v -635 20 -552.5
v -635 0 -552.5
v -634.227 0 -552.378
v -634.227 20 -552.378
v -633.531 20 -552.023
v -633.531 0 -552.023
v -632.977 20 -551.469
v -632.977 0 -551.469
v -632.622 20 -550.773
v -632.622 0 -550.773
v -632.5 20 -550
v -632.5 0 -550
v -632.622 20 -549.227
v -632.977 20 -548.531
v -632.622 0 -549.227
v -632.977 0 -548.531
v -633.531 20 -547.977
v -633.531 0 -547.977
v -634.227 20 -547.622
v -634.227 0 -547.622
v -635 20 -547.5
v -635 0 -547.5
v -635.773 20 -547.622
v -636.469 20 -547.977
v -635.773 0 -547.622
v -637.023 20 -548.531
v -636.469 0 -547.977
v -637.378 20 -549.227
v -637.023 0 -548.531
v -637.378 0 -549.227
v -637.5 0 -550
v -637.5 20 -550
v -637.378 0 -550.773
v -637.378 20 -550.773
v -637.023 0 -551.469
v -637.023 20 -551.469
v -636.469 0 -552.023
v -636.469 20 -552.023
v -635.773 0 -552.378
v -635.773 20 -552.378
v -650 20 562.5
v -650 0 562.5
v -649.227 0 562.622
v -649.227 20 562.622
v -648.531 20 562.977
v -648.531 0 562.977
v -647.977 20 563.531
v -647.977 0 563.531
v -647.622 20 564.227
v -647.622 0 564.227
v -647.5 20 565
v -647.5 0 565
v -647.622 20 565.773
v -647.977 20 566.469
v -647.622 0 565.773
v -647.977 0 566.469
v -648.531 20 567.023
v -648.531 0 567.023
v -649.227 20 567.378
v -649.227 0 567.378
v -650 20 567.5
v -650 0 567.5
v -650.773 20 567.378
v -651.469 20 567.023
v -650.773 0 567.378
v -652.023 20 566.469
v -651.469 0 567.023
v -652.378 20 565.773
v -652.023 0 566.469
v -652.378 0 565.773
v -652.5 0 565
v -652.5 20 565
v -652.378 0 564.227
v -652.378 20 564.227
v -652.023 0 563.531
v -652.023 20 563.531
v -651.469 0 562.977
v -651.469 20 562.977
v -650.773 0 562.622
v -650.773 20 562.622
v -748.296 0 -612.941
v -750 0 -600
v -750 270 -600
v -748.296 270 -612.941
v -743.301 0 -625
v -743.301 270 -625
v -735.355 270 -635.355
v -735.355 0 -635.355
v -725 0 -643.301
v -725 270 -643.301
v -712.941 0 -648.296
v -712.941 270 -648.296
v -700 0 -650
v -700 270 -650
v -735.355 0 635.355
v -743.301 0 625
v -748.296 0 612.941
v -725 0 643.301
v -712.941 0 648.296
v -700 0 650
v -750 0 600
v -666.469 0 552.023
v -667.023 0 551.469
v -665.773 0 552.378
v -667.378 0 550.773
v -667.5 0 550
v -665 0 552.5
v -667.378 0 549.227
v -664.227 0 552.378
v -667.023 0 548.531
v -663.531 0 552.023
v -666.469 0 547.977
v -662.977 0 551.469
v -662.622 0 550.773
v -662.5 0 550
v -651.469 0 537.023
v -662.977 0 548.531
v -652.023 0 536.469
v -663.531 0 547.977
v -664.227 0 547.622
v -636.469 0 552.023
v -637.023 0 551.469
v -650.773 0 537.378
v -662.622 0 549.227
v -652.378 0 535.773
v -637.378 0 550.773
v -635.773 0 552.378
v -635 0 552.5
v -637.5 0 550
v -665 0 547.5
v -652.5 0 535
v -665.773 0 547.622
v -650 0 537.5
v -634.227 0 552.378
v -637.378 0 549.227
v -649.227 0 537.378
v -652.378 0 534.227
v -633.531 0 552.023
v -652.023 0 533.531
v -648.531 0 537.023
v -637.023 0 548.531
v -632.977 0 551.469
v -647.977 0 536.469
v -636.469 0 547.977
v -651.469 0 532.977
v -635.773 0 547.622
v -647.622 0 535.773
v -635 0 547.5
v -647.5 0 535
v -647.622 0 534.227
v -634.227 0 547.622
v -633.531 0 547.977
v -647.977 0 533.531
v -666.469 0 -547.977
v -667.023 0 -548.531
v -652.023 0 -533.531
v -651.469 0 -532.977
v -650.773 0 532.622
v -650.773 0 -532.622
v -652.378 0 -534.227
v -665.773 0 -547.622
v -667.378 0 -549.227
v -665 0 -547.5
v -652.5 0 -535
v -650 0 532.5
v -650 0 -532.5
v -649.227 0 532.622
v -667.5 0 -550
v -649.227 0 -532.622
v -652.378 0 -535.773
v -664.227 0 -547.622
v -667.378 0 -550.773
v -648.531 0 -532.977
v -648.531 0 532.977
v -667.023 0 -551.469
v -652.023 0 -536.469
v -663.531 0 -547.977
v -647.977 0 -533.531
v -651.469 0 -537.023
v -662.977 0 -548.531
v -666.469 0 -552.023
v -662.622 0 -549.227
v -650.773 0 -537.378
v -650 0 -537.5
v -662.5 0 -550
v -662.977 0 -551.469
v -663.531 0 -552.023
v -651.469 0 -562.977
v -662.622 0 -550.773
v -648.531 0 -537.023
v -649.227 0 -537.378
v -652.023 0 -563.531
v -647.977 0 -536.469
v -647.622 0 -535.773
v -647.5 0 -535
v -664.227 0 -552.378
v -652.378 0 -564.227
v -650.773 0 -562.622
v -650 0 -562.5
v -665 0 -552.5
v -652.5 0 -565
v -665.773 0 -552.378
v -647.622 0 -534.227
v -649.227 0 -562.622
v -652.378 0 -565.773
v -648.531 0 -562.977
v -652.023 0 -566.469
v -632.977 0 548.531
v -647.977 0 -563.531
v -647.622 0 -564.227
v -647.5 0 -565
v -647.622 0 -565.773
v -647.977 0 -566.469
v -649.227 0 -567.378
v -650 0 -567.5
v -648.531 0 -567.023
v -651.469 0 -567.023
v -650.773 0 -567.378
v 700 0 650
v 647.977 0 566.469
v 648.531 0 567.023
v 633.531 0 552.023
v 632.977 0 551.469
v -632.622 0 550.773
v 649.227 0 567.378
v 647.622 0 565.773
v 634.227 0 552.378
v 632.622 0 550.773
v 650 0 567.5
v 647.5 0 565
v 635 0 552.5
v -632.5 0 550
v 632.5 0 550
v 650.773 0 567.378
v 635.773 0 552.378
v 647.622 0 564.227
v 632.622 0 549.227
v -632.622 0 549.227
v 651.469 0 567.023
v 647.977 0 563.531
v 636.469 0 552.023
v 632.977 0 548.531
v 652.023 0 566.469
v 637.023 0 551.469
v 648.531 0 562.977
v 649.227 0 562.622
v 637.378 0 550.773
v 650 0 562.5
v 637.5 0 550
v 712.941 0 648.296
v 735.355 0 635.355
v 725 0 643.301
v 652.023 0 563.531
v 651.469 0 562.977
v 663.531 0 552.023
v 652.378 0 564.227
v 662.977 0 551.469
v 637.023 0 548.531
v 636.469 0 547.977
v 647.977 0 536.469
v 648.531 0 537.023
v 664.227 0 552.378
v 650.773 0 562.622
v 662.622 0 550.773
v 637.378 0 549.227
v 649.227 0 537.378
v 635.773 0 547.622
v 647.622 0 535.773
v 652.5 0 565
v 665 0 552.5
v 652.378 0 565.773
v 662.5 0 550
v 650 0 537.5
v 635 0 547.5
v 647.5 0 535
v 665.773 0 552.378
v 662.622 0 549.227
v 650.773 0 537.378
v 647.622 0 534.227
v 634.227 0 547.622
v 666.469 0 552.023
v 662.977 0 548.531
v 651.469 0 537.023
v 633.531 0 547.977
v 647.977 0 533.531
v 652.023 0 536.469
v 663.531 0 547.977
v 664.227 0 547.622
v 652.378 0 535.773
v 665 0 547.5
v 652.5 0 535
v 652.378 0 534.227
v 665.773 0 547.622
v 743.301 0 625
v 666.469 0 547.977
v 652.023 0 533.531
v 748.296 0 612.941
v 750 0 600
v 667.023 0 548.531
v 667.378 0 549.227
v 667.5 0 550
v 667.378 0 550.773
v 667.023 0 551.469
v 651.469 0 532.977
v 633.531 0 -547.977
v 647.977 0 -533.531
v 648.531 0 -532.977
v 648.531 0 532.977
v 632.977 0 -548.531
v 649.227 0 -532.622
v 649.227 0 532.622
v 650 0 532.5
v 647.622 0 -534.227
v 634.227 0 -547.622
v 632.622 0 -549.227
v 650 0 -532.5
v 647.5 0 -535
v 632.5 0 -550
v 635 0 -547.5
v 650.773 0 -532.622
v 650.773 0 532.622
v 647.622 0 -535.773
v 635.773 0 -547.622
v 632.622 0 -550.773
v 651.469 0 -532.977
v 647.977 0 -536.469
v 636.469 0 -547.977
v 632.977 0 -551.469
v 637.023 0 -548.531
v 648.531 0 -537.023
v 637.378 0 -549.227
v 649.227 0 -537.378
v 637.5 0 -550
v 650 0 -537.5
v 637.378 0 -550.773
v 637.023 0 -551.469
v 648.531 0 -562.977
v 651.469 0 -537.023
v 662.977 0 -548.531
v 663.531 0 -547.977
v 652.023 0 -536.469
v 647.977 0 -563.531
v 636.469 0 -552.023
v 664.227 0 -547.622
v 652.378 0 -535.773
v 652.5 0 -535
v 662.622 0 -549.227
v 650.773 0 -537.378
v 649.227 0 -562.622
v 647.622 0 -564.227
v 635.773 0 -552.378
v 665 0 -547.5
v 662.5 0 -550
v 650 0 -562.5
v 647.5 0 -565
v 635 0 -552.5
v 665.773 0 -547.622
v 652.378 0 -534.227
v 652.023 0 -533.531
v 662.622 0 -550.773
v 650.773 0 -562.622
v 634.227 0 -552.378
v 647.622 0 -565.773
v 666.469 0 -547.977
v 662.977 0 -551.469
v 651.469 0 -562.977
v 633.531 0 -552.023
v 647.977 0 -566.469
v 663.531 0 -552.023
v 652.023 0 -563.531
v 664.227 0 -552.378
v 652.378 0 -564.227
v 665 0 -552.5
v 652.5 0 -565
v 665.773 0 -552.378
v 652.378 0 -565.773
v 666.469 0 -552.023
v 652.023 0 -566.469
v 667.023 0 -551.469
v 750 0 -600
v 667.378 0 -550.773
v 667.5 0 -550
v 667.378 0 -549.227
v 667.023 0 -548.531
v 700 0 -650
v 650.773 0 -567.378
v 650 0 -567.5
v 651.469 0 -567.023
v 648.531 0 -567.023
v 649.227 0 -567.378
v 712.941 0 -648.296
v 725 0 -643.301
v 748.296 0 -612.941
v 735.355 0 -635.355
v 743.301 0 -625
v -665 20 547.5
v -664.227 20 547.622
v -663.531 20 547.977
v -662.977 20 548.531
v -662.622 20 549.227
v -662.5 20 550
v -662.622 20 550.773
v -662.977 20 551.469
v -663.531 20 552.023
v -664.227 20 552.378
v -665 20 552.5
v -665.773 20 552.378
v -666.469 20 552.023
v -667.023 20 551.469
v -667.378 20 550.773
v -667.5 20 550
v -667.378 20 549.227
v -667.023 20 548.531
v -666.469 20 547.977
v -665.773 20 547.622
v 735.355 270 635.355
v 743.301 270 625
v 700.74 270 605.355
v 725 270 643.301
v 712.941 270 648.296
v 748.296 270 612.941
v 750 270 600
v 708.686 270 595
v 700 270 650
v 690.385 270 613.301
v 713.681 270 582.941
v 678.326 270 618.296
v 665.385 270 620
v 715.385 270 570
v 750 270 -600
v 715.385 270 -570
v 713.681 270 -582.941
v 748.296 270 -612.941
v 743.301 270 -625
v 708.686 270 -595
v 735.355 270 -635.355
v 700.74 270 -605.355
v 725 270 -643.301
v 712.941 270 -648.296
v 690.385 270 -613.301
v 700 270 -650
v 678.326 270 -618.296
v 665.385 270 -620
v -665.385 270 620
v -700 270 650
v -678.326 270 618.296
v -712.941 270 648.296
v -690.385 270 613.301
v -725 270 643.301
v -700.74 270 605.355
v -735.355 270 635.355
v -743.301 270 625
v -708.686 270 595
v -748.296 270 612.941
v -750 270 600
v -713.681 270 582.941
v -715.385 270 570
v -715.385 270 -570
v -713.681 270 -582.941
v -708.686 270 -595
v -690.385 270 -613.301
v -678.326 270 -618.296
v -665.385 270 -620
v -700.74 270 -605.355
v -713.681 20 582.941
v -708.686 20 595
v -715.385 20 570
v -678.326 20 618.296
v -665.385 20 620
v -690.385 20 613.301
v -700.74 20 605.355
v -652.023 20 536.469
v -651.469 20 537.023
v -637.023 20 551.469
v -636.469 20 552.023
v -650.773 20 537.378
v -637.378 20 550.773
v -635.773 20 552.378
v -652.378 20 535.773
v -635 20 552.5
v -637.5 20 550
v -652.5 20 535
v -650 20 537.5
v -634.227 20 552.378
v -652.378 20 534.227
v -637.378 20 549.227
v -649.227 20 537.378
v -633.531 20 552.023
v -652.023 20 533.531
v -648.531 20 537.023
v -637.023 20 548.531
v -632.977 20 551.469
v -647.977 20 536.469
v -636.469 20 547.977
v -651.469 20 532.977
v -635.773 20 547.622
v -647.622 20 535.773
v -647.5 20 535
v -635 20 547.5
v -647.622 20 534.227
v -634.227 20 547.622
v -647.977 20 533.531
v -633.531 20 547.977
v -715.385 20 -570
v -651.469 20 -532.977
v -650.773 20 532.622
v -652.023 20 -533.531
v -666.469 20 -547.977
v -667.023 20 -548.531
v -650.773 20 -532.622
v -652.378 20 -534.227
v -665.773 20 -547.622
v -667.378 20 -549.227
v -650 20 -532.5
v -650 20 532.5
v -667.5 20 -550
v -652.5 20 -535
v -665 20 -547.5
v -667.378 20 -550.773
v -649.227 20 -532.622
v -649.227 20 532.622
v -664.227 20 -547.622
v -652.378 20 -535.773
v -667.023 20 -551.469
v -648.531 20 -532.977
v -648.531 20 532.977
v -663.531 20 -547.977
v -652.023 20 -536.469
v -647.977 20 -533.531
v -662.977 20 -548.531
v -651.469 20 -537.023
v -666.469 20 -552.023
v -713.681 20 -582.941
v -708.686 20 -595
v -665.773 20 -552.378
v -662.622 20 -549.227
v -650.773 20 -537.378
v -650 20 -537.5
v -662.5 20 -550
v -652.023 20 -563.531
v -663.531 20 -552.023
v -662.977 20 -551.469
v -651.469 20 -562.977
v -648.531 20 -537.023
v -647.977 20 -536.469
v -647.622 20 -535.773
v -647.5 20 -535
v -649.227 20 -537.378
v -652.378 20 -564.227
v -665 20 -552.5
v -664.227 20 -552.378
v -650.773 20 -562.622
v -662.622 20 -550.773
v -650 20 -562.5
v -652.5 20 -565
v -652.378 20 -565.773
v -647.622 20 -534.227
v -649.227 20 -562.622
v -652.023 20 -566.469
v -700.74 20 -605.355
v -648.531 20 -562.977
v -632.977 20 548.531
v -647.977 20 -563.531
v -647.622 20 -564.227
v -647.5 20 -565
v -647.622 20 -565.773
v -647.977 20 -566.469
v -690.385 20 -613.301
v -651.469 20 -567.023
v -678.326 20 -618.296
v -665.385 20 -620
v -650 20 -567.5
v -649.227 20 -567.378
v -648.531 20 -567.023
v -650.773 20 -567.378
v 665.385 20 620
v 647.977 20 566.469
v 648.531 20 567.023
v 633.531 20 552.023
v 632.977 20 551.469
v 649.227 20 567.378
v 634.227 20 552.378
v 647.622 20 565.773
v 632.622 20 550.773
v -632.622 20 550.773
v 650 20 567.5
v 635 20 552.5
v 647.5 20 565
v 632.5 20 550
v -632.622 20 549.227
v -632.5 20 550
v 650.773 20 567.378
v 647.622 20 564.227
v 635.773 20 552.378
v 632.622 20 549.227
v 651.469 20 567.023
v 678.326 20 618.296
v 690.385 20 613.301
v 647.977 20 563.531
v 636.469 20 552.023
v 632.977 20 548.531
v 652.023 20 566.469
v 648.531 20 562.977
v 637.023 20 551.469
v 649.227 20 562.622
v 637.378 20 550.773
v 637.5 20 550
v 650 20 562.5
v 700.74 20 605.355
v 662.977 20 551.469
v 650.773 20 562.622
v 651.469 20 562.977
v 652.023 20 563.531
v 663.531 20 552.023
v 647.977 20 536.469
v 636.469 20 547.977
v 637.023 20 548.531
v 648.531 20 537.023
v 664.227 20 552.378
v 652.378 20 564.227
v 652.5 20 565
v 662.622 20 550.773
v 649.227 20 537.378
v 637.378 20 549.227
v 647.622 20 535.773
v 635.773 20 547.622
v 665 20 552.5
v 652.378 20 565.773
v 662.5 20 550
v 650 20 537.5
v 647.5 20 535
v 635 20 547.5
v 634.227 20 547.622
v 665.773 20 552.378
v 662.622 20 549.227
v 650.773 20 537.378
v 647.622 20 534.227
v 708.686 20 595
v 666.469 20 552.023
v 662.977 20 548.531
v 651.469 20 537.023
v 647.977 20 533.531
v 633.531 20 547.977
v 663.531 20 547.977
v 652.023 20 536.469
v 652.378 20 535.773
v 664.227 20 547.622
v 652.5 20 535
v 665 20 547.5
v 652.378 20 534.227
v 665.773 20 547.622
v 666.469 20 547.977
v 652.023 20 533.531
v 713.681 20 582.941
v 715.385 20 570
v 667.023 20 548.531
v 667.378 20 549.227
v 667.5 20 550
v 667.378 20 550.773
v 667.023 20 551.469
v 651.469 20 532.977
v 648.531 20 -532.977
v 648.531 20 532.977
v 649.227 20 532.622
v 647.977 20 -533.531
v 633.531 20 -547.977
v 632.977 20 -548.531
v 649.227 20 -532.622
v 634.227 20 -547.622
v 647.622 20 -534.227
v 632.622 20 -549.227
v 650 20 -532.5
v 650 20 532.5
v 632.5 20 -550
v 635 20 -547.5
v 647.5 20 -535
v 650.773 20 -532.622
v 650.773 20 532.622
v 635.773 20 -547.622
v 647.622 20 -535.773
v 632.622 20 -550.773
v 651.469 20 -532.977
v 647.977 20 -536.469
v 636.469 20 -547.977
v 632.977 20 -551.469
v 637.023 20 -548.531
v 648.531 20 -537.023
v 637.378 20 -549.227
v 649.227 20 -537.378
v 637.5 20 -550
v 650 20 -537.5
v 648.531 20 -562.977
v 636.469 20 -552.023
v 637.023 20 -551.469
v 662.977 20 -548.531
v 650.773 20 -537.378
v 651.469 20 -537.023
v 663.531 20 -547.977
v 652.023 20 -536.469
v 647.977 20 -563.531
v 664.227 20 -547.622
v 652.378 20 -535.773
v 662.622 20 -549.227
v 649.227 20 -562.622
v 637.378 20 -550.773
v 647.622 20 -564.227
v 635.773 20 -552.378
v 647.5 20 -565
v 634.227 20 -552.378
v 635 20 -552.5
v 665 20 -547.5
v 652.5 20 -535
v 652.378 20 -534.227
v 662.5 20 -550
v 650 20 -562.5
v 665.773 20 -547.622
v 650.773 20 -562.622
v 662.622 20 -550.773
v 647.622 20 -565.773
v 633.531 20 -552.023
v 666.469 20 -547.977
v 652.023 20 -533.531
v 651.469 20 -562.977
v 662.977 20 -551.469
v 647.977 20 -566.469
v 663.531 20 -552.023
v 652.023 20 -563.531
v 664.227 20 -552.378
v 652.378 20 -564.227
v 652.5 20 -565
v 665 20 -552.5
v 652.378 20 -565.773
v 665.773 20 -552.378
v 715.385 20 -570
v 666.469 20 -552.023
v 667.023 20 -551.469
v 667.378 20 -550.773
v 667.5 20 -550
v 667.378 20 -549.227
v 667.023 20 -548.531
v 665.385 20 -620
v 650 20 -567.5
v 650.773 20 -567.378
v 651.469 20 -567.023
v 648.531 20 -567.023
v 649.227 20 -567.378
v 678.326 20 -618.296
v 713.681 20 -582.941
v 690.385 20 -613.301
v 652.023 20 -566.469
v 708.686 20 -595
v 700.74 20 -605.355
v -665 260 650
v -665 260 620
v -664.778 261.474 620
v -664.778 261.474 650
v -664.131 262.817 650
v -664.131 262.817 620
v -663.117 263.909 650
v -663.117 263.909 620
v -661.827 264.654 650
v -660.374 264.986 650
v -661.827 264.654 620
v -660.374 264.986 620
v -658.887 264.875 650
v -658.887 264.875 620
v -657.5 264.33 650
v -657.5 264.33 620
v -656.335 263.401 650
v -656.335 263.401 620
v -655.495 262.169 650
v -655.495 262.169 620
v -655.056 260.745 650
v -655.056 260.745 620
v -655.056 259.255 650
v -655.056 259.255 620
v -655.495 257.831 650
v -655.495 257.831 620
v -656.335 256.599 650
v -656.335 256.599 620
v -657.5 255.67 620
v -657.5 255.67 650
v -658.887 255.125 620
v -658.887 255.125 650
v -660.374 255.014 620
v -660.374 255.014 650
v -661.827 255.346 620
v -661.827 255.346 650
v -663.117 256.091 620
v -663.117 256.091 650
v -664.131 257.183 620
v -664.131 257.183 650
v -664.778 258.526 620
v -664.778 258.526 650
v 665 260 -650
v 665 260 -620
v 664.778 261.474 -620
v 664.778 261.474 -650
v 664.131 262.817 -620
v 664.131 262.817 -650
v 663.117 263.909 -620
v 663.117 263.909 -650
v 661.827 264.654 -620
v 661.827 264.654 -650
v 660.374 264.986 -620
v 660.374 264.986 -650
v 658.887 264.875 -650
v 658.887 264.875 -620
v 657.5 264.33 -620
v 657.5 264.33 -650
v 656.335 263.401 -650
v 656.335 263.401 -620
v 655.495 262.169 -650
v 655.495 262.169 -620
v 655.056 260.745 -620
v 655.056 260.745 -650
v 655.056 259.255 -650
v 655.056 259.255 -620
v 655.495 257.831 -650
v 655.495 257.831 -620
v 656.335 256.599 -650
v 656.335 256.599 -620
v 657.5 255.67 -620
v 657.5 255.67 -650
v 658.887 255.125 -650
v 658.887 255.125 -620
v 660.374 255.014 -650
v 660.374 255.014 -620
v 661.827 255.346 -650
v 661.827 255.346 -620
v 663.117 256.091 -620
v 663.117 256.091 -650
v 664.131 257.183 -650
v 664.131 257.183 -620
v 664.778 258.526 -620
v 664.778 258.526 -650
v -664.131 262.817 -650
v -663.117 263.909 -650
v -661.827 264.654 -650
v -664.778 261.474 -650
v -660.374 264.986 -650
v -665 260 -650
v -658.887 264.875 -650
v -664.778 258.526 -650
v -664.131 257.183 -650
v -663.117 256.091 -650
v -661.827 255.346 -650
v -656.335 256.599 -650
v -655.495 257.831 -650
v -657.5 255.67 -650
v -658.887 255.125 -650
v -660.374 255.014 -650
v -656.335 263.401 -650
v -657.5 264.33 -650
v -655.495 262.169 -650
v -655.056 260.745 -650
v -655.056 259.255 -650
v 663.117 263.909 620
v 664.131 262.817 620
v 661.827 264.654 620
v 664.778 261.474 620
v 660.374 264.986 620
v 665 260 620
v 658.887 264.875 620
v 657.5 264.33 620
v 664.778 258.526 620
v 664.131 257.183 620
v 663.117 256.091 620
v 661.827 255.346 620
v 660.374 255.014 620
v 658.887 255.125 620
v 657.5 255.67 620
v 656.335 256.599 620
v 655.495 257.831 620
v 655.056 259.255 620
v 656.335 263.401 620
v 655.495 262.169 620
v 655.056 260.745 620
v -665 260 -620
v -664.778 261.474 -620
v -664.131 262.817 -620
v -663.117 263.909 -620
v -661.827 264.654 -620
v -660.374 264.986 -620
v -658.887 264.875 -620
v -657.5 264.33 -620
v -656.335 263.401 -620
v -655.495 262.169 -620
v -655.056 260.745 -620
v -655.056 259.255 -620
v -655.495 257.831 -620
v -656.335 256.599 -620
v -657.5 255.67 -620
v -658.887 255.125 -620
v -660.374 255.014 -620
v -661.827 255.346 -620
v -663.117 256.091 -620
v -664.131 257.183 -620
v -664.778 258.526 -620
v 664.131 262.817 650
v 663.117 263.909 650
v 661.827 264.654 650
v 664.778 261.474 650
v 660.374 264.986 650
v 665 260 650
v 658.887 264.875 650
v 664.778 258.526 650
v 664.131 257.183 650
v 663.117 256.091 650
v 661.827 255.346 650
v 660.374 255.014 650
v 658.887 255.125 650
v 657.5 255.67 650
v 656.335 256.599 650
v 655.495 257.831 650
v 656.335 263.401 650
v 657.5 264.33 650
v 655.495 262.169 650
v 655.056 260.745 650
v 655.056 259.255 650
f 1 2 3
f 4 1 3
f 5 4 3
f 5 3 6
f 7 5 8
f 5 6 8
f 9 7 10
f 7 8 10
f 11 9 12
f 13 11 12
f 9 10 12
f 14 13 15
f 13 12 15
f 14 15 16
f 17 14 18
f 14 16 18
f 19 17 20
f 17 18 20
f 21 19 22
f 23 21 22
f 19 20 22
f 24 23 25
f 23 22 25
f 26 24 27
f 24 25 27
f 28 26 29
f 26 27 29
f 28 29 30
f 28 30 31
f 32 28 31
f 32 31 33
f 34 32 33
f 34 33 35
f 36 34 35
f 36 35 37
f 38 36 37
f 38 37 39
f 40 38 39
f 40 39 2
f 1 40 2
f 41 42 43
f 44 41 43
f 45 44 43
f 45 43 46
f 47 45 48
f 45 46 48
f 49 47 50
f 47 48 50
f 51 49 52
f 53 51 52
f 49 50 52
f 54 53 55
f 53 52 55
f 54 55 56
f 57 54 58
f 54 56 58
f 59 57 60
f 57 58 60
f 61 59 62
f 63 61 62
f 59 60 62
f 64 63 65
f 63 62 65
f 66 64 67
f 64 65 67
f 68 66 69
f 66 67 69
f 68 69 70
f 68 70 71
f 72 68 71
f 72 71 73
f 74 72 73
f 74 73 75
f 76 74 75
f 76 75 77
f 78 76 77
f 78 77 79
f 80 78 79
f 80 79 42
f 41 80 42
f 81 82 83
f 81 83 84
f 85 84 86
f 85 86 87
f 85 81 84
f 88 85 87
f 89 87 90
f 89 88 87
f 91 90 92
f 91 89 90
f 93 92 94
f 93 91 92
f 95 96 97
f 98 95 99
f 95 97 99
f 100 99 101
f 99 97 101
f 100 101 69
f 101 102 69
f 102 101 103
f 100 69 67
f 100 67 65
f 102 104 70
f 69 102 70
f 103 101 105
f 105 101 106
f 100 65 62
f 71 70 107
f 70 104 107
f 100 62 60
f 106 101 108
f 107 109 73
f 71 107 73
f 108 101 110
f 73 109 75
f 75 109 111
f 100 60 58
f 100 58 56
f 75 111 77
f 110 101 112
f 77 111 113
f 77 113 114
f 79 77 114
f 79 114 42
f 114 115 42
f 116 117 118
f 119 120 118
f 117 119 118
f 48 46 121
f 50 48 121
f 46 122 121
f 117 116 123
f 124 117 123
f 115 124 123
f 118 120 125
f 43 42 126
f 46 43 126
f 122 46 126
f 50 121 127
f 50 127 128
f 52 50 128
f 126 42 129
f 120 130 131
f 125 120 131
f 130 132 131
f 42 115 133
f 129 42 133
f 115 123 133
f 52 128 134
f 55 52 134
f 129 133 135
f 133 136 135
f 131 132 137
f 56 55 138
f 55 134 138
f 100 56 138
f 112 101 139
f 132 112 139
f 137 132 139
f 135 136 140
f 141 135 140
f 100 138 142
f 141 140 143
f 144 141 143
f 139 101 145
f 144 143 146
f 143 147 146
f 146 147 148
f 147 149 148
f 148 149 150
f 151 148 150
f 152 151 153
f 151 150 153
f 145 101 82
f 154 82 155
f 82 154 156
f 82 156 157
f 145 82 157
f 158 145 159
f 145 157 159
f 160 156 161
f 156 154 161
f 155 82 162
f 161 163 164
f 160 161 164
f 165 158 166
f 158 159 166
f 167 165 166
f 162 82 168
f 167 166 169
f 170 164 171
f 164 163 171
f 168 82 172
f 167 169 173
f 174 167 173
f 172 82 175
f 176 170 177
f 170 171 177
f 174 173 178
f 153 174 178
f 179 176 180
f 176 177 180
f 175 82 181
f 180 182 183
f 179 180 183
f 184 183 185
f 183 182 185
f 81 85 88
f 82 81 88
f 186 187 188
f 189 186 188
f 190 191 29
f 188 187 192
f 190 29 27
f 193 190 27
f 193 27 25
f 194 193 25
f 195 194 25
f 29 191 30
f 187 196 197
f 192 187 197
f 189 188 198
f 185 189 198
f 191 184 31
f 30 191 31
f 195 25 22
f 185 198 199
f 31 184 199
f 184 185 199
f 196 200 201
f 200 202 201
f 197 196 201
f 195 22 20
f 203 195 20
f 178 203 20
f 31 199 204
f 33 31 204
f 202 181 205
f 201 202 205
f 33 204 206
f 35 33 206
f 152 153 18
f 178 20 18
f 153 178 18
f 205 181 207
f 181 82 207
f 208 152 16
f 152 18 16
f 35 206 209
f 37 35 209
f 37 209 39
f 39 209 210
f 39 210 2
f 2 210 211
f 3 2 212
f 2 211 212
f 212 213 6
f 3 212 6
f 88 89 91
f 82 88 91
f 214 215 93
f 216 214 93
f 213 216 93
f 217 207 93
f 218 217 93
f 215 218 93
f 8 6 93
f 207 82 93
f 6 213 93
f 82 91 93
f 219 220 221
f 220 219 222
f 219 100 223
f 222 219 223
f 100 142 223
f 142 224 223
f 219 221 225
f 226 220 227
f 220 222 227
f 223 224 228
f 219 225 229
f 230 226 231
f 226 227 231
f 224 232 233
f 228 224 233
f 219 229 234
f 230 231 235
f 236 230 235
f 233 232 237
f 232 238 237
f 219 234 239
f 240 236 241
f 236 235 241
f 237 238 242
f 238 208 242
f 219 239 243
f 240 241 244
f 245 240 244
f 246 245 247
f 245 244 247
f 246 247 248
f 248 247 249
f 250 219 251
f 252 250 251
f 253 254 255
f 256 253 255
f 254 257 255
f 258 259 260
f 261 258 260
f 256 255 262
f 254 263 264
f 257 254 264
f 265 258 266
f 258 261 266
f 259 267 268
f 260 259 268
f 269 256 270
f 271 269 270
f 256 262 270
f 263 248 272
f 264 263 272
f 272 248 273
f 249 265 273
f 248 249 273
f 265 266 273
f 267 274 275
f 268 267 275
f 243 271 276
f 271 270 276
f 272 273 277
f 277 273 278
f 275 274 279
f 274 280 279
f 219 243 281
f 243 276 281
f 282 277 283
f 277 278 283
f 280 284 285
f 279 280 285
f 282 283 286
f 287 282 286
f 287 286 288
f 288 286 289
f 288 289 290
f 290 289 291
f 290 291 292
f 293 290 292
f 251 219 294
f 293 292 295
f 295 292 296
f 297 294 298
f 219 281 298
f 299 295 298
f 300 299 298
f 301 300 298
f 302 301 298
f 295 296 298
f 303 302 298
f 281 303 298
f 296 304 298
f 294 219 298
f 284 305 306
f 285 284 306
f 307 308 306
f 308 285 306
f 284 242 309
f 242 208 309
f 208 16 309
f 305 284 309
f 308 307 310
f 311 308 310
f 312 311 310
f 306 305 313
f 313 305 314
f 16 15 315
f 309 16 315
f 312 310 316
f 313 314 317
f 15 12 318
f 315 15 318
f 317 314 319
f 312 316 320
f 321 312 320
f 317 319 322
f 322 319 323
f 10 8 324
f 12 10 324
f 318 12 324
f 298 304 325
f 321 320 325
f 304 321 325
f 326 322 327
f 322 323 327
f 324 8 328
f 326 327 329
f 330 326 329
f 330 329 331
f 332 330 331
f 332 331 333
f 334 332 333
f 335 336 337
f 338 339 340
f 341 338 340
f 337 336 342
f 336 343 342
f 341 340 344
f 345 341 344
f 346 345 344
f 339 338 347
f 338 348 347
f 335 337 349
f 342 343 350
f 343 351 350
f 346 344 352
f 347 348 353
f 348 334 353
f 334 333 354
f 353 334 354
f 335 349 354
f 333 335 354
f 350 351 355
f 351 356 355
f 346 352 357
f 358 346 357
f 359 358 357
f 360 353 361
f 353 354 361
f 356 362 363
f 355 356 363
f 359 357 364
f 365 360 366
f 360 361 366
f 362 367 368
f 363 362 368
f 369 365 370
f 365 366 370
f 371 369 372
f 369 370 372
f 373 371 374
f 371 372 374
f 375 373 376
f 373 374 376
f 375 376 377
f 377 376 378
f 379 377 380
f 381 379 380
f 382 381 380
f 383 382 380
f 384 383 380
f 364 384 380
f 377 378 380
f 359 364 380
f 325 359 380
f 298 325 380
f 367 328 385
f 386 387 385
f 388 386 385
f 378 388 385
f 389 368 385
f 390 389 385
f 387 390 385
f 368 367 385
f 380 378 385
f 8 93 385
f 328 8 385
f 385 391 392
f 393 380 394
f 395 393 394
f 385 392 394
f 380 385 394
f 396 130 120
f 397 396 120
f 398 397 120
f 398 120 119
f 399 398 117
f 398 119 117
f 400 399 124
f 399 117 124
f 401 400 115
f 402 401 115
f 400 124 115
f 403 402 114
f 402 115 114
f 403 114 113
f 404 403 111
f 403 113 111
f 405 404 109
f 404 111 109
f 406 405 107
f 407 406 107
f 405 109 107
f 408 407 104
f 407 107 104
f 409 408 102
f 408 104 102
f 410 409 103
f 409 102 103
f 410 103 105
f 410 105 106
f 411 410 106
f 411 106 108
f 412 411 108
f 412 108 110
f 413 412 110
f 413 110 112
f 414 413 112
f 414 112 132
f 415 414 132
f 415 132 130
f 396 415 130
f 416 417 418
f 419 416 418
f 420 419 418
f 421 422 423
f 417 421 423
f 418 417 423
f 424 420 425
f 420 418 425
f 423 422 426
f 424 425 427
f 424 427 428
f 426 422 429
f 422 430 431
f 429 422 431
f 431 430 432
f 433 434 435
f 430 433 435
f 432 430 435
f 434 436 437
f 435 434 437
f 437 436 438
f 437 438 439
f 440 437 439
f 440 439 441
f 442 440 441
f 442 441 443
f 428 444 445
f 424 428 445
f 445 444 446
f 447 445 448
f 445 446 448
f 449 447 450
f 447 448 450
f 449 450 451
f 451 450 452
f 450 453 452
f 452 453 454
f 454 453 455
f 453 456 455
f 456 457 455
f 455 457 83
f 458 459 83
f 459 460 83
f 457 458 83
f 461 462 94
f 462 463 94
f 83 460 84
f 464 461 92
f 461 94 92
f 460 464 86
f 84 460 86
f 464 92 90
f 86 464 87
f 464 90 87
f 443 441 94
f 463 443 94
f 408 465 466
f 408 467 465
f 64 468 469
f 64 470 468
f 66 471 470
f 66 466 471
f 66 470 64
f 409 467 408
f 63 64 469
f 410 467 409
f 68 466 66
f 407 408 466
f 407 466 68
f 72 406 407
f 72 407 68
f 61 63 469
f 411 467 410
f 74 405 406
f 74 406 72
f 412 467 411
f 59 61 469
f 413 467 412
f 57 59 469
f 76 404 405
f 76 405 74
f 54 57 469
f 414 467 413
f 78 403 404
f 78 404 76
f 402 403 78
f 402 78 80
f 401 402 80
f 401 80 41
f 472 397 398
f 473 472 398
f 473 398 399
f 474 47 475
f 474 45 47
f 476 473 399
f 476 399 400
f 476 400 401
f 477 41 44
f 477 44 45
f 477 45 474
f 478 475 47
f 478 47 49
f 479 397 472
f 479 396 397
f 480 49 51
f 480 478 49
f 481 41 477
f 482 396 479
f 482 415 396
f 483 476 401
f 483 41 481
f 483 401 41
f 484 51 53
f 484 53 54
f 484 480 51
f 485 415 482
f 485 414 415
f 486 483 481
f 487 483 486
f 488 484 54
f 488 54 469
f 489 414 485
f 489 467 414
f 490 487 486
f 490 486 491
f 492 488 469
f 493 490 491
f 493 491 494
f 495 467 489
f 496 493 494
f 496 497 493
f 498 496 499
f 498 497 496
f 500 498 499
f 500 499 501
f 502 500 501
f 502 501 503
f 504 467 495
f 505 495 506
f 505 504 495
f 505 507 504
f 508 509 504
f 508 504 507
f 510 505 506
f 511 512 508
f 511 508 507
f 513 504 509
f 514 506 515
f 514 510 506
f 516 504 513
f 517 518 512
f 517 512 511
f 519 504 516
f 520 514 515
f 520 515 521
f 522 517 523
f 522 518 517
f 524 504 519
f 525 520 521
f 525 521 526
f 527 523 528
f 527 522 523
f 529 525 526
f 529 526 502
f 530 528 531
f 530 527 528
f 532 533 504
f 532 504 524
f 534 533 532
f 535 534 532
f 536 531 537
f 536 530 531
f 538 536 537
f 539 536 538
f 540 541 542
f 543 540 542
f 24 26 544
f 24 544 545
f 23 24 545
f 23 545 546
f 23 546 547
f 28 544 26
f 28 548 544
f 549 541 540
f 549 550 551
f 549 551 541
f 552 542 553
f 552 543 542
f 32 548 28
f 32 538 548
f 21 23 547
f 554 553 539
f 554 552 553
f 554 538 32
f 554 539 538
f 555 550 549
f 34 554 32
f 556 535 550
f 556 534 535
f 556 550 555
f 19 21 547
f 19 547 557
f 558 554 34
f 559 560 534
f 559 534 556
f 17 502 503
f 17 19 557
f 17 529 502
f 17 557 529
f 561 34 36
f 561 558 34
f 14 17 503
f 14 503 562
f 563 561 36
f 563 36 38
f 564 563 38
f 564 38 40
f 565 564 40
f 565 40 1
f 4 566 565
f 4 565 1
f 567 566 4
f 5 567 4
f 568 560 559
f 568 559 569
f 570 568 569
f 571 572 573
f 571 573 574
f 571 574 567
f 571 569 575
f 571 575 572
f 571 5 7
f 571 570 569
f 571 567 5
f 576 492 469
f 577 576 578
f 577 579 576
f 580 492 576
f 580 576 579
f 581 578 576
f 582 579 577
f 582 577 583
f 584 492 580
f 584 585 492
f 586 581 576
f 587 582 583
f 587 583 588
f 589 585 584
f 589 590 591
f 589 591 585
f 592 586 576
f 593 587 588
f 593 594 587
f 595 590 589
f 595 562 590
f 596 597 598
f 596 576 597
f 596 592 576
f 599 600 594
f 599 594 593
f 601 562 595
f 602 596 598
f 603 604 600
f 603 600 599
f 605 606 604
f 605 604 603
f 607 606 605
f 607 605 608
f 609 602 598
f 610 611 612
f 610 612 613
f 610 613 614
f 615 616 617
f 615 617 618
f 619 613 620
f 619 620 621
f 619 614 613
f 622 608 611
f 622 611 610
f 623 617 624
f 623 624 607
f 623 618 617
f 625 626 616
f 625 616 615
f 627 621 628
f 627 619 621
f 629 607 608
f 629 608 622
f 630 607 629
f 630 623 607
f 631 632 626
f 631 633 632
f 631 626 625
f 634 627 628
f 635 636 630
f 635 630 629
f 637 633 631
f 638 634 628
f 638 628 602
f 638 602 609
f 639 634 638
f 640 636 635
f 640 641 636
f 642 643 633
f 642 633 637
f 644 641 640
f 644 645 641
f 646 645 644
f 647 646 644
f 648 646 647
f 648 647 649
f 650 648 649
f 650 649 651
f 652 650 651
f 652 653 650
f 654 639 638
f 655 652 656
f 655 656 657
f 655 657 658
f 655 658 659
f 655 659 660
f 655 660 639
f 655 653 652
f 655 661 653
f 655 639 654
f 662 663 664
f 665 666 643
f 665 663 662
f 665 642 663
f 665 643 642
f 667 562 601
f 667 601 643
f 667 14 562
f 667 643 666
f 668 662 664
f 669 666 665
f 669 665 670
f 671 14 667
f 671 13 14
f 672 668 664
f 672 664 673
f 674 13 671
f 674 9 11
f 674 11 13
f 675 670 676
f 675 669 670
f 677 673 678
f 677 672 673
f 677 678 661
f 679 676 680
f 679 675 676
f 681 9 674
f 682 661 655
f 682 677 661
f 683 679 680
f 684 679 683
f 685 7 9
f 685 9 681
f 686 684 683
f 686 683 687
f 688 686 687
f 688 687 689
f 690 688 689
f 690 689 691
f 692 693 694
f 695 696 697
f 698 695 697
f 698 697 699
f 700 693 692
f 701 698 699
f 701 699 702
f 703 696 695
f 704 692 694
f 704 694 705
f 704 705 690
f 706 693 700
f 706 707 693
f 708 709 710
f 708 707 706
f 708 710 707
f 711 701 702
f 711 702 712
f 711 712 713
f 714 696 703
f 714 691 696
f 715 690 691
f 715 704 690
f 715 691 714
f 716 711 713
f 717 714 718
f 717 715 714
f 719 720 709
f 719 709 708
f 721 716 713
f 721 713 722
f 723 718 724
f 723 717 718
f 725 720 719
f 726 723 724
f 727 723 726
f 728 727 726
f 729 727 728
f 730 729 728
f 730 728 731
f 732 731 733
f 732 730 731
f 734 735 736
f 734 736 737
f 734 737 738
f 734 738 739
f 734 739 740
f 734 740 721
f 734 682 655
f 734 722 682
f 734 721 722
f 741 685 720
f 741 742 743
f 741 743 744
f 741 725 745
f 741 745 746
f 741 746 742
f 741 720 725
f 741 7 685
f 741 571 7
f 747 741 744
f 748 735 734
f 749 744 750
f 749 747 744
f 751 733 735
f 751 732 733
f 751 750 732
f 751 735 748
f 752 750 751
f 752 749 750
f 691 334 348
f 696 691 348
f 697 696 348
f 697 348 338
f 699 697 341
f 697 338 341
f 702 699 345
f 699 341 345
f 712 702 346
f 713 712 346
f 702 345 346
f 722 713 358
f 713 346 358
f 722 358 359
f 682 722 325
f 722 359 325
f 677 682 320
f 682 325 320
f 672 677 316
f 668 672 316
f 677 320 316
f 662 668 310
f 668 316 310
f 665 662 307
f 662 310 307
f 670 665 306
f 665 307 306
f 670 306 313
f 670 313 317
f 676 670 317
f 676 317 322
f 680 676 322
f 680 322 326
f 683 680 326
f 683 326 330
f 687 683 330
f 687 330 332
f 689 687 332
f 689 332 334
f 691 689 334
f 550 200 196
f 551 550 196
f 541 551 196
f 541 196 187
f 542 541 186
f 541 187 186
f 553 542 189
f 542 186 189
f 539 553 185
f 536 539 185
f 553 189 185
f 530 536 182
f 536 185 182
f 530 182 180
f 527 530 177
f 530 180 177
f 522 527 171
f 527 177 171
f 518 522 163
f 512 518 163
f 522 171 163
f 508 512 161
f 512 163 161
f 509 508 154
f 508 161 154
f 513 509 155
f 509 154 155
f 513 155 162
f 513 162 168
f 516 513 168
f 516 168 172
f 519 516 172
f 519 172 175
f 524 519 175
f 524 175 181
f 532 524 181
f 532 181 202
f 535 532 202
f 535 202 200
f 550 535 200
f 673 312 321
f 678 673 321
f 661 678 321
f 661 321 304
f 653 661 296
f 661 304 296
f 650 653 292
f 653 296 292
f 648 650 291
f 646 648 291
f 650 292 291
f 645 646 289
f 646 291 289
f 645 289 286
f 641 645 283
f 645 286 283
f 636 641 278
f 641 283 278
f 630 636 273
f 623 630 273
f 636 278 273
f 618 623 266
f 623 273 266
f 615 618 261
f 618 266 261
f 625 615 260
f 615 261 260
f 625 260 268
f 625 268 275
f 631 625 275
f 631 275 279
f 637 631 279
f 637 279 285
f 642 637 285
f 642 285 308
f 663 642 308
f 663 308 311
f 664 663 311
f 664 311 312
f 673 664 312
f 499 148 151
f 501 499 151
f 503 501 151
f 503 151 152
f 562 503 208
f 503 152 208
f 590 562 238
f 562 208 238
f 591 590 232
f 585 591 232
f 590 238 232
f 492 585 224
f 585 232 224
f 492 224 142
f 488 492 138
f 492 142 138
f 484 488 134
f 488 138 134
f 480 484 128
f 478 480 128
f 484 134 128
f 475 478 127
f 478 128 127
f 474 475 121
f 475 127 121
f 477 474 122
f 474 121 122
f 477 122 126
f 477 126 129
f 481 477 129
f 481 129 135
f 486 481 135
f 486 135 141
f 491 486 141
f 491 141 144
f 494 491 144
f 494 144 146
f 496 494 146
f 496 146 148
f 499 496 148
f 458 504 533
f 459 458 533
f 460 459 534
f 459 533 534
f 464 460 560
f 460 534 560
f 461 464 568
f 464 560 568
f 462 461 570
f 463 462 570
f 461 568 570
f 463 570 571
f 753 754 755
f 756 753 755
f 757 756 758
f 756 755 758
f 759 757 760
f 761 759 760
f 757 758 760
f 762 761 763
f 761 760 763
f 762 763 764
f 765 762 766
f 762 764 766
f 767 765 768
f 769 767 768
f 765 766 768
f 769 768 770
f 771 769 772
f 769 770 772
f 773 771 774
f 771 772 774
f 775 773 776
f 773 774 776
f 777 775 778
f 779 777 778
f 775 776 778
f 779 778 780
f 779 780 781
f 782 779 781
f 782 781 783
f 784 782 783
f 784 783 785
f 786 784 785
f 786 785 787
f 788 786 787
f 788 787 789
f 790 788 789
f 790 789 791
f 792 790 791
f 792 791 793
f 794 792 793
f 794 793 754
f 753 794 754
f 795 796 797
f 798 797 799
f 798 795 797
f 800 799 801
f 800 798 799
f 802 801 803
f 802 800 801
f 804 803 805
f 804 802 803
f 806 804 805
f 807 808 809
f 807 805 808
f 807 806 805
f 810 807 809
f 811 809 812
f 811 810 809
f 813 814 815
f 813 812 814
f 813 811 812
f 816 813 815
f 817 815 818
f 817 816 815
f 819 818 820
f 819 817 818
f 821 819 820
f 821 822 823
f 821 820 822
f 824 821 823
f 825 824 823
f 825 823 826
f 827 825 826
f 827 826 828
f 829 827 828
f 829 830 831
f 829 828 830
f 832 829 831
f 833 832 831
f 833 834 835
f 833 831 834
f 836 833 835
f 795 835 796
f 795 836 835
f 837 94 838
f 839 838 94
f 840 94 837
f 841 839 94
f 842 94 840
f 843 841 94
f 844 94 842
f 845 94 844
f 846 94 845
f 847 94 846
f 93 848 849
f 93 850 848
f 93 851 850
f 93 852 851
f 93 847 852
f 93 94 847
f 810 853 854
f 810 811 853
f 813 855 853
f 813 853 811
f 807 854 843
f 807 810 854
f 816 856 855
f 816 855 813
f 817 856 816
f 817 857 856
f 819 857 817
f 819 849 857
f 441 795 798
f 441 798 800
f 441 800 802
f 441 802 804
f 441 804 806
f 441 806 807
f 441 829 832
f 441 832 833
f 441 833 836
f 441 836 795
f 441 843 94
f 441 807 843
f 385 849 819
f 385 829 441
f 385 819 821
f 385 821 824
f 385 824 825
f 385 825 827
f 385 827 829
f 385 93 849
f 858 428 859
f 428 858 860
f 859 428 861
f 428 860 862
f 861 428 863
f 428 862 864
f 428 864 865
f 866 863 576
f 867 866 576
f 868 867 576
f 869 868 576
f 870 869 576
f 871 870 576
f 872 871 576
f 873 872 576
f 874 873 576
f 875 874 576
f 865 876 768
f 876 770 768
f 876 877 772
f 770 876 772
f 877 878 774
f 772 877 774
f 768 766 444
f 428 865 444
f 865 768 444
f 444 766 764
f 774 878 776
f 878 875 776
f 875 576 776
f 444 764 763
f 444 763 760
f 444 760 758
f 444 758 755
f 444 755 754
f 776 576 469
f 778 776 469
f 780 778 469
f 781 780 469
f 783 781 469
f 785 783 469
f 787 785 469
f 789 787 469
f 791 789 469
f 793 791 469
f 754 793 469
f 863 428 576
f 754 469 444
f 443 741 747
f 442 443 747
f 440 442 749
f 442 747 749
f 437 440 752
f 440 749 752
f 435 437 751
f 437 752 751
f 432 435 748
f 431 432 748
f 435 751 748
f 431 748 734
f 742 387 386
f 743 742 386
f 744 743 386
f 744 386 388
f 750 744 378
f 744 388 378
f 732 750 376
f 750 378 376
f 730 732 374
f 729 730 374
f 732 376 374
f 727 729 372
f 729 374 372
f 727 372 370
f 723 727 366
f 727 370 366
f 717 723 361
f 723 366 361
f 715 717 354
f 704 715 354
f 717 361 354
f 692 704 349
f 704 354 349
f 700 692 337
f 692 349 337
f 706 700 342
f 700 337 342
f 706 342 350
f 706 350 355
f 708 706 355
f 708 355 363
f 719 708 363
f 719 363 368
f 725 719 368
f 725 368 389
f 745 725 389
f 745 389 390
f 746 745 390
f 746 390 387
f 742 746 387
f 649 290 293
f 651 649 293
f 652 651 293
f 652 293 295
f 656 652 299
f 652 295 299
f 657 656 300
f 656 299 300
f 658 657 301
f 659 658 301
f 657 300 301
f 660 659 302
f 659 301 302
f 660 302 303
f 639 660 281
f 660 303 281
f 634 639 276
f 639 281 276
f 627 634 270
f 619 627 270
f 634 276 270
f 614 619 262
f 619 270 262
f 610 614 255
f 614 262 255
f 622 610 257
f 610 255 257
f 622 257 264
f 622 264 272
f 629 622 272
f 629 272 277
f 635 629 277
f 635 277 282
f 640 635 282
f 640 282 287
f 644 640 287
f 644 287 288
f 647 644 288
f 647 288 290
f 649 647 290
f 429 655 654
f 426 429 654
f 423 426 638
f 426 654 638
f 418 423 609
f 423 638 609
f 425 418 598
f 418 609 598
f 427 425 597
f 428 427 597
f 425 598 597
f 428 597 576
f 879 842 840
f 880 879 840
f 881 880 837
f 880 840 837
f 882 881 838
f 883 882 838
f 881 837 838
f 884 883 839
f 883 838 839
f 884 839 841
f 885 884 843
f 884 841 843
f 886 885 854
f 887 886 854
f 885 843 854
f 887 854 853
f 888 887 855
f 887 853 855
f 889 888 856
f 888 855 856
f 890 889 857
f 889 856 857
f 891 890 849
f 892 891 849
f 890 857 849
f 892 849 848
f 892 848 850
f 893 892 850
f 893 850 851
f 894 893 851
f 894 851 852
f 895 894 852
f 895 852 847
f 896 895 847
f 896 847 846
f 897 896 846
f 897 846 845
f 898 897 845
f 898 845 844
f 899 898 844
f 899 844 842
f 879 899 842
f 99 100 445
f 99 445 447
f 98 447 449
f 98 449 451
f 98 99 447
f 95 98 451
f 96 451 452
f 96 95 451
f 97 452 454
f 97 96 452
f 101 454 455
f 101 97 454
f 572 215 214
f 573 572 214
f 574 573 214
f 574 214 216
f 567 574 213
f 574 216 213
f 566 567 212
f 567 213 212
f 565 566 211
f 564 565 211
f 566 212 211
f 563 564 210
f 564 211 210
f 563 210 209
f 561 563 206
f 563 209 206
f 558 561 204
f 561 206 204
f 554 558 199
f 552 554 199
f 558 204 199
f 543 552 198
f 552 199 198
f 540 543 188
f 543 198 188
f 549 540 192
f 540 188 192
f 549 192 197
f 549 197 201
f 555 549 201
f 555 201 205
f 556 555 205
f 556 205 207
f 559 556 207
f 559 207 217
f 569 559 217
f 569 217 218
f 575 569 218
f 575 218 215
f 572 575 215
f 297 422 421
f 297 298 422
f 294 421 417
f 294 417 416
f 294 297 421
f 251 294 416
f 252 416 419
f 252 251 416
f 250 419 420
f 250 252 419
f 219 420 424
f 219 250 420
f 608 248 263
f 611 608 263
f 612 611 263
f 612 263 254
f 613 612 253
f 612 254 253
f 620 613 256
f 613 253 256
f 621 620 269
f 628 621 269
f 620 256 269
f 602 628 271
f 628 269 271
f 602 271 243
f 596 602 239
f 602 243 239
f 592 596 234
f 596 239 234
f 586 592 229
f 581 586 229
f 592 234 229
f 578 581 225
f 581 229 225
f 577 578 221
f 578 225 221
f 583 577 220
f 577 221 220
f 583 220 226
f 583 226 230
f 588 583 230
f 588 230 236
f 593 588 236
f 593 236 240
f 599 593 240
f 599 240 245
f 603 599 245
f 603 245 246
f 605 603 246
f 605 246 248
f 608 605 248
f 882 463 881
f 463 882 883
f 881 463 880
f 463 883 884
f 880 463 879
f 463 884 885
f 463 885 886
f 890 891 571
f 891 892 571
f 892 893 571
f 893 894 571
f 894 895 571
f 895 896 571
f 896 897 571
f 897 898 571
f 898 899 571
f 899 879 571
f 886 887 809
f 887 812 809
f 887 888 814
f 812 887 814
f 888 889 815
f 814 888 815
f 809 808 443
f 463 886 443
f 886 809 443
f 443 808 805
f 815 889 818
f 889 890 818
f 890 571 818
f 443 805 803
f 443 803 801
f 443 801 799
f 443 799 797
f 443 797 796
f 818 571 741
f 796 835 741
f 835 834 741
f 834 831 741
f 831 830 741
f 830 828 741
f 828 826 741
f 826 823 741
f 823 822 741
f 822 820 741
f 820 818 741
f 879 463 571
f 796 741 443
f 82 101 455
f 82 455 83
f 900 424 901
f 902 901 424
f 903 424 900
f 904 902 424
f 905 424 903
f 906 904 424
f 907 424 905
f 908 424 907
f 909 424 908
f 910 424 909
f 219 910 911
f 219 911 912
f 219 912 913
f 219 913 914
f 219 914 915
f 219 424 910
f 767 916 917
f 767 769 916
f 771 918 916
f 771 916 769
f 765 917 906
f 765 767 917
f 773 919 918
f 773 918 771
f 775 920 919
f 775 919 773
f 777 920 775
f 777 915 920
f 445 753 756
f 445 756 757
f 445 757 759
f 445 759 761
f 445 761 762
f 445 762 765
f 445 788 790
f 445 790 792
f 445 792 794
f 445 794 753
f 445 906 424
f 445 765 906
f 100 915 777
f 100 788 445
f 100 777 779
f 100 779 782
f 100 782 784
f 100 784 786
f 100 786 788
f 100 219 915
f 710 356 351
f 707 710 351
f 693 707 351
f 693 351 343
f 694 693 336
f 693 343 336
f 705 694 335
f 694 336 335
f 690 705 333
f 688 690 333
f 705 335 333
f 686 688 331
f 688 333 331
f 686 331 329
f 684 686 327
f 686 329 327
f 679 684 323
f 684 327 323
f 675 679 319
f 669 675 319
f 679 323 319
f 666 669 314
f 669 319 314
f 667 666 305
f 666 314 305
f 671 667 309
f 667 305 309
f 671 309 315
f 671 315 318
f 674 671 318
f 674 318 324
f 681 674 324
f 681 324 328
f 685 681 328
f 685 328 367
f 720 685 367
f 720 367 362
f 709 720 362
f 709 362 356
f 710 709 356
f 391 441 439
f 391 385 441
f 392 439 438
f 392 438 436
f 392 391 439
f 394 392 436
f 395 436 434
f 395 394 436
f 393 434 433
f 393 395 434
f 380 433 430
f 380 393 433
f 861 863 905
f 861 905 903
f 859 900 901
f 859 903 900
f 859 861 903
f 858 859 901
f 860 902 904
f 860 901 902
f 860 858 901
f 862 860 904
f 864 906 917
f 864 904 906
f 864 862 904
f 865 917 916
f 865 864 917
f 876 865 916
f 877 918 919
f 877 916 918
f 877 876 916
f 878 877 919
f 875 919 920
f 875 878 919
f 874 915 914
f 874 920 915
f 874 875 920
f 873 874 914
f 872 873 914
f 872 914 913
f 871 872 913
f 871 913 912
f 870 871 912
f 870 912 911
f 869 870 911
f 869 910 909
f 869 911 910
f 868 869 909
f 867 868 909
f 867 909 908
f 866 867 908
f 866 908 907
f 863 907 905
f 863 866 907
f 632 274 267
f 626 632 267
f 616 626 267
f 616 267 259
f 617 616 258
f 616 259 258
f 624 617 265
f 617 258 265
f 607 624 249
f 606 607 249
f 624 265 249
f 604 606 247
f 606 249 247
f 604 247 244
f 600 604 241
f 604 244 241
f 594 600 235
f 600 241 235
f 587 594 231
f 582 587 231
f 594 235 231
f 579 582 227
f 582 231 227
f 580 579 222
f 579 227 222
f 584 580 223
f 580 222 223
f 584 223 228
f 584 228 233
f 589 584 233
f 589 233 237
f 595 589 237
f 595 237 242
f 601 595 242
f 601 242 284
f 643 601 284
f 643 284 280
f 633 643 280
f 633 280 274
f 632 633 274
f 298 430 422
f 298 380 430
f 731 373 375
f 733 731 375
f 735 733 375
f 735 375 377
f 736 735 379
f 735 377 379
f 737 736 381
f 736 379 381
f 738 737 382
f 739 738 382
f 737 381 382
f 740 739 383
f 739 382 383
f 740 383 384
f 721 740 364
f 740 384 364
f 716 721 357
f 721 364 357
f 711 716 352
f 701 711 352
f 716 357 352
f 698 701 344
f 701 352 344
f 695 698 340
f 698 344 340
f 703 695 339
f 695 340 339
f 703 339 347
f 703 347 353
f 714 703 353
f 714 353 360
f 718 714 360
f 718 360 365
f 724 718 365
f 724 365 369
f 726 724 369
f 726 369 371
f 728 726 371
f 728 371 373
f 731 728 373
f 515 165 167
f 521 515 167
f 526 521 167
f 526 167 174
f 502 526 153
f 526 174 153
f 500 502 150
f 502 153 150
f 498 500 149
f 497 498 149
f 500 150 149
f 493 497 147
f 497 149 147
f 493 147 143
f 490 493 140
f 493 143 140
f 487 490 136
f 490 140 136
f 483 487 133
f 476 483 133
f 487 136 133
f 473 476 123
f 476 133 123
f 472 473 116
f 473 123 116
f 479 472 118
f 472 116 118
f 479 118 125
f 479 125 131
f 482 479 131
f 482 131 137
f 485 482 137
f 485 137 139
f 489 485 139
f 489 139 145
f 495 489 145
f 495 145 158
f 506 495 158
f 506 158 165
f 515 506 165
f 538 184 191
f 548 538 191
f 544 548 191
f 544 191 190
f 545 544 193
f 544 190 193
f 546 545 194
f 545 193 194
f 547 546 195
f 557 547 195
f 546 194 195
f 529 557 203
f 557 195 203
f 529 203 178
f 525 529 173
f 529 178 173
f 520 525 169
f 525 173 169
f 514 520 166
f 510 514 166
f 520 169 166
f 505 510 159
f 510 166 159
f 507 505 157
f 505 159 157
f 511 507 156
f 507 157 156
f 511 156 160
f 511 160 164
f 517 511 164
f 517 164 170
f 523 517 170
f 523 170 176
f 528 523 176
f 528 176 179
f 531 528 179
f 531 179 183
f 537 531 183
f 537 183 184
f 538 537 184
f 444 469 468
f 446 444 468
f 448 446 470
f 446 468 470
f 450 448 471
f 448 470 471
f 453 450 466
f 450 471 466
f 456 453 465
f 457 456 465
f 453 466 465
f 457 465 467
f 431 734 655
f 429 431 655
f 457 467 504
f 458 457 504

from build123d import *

# Parameters (mm, degrees)
EXTRUDE_1_DEPTH     = 20
EXTRUDE_2_DEPTH     = 250
SKETCH_3_R          = 2.5
CUT_EXTRUDE_1_DEPTH = 250
SKETCH_4_R          = 5
CUT_EXTRUDE_2_DEPTH = 1500


with BuildPart() as part:
    # Эскиз1 → Бобышка-Вытянуть1 (new body)
    with BuildSketch(Plane(origin=(0, 0, 0), x_dir=(1, 0, 0), z_dir=(0, 1, 0))):
        with BuildLine():
            Line((-700, -650), (700, -650))
            ThreePointArc((700, -650), (735.355339059, -635.355339059), (750, -600))
            Line((750, -600), (750, 600))
            ThreePointArc((750, 600), (735.355339059, 635.355339059), (700, 650))
            Line((700, 650), (-700, 650))
            ThreePointArc((-700, 650), (-735.355339059, 635.355339059), (-750, 600))
            Line((-750, 600), (-750, -600))
            ThreePointArc((-750, -600), (-735.355339059, -635.355339059), (-700, -650))
        make_face()
    extrude(amount=EXTRUDE_1_DEPTH)

    # Эскиз2 → Бобышка-Вытянуть2 (add)
    with BuildSketch(Plane(origin=(0, 20, 0), x_dir=(1, 0, 0), z_dir=(0, 1, 0))):
        with BuildLine():
            Line((700, -650), (-700, -650))
            ThreePointArc((-700, -650), (-735.355339059, -635.355339059), (-750, -600))
            Line((-750, -600), (-750, 600))
            ThreePointArc((-750, 600), (-735.355339059, 635.355339059), (-700, 650))
            Line((-700, 650), (700, 650))
            ThreePointArc((700, 650), (735.355339059, 635.355339059), (750, 600))
            Line((750, 600), (750, -600))
            ThreePointArc((750, -600), (735.355339059, -635.355339059), (700, -650))
        make_face()
        with BuildLine():
            Line((665.384615385, -620), (-665.384615385, -620))
            ThreePointArc((-665.384615385, -620), (-700.739954444, -605.355339059), (-715.384615385, -570))
            Line((-715.384615385, -570), (-715.384615385, 570))
            ThreePointArc((-715.384615385, 570), (-700.739954444, 605.355339059), (-665.384615385, 620))
            Line((-665.384615385, 620), (665.384615385, 620))
            ThreePointArc((665.384615385, 620), (700.739954444, 605.355339059), (715.384615385, 570))
            Line((715.384615385, 570), (715.384615385, -570))
            ThreePointArc((715.384615385, -570), (700.739954444, -605.355339059), (665.384615385, -620))
        make_face(mode=Mode.SUBTRACT)
    extrude(amount=EXTRUDE_2_DEPTH)

    # Эскиз3 → Вырез-Вытянуть1 (cut)
    with BuildSketch(Plane.XZ):
        with Locations(Location((-650, -565, 0), (0, 0, 270))):
            Circle(SKETCH_3_R)
        with Locations(Location((-650, 565, 0), (0, 0, 270))):
            Circle(SKETCH_3_R)
        with Locations(Location((-665, 550, 0), (0, 0, 270))):
            Circle(SKETCH_3_R)
        with Locations(Location((-635, 550, 0), (0, 0, 270))):
            Circle(SKETCH_3_R)
        with Locations(Location((-650, 535, 0), (0, 0, 270))):
            Circle(SKETCH_3_R)
        with Locations(Location((665, 550, 0), (0, 0, 270))):
            Circle(SKETCH_3_R)
        with Locations(Location((650, 565, 0), (0, 0, 270))):
            Circle(SKETCH_3_R)
        with Locations(Location((635, 550, 0), (0, 0, 270))):
            Circle(SKETCH_3_R)
        with Locations(Location((650, 535, 0), (0, 0, 270))):
            Circle(SKETCH_3_R)
        with Locations(Location((650, -535, 0), (0, 0, 270))):
            Circle(SKETCH_3_R)
        with Locations(Location((635, -550, 0), (0, 0, 270))):
            Circle(SKETCH_3_R)
        with Locations(Location((665, -550, 0), (0, 0, 270))):
            Circle(SKETCH_3_R)
        with Locations(Location((650, -565, 0), (0, 0, 270))):
            Circle(SKETCH_3_R)
        with Locations(Location((-650, -535, 0), (0, 0, 270))):
            Circle(SKETCH_3_R)
        with Locations(Location((-665, -550, 0), (0, 0, 270))):
            Circle(SKETCH_3_R)
        with Locations(Location((-635, -550, 0), (0, 0, 270))):
            Circle(SKETCH_3_R)
    extrude(amount=-CUT_EXTRUDE_1_DEPTH, mode=Mode.SUBTRACT)

    # Эскиз4 → Вырез-Вытянуть2 (cut)
    with BuildSketch(Plane(origin=(0, 0, -650), x_dir=(-1, 0, 0), z_dir=(0, 0, -1))):
        with Locations((660, 260)):
            Circle(SKETCH_4_R)
    cut_extrude_2 = extrude(amount=-CUT_EXTRUDE_2_DEPTH, mode=Mode.SUBTRACT)

    # Зеркальное отражение1: Вырез-Вытянуть2 across plane
    add(cut_extrude_2.mirror(Plane.ZY), mode=Mode.SUBTRACT)


solid = part.part
